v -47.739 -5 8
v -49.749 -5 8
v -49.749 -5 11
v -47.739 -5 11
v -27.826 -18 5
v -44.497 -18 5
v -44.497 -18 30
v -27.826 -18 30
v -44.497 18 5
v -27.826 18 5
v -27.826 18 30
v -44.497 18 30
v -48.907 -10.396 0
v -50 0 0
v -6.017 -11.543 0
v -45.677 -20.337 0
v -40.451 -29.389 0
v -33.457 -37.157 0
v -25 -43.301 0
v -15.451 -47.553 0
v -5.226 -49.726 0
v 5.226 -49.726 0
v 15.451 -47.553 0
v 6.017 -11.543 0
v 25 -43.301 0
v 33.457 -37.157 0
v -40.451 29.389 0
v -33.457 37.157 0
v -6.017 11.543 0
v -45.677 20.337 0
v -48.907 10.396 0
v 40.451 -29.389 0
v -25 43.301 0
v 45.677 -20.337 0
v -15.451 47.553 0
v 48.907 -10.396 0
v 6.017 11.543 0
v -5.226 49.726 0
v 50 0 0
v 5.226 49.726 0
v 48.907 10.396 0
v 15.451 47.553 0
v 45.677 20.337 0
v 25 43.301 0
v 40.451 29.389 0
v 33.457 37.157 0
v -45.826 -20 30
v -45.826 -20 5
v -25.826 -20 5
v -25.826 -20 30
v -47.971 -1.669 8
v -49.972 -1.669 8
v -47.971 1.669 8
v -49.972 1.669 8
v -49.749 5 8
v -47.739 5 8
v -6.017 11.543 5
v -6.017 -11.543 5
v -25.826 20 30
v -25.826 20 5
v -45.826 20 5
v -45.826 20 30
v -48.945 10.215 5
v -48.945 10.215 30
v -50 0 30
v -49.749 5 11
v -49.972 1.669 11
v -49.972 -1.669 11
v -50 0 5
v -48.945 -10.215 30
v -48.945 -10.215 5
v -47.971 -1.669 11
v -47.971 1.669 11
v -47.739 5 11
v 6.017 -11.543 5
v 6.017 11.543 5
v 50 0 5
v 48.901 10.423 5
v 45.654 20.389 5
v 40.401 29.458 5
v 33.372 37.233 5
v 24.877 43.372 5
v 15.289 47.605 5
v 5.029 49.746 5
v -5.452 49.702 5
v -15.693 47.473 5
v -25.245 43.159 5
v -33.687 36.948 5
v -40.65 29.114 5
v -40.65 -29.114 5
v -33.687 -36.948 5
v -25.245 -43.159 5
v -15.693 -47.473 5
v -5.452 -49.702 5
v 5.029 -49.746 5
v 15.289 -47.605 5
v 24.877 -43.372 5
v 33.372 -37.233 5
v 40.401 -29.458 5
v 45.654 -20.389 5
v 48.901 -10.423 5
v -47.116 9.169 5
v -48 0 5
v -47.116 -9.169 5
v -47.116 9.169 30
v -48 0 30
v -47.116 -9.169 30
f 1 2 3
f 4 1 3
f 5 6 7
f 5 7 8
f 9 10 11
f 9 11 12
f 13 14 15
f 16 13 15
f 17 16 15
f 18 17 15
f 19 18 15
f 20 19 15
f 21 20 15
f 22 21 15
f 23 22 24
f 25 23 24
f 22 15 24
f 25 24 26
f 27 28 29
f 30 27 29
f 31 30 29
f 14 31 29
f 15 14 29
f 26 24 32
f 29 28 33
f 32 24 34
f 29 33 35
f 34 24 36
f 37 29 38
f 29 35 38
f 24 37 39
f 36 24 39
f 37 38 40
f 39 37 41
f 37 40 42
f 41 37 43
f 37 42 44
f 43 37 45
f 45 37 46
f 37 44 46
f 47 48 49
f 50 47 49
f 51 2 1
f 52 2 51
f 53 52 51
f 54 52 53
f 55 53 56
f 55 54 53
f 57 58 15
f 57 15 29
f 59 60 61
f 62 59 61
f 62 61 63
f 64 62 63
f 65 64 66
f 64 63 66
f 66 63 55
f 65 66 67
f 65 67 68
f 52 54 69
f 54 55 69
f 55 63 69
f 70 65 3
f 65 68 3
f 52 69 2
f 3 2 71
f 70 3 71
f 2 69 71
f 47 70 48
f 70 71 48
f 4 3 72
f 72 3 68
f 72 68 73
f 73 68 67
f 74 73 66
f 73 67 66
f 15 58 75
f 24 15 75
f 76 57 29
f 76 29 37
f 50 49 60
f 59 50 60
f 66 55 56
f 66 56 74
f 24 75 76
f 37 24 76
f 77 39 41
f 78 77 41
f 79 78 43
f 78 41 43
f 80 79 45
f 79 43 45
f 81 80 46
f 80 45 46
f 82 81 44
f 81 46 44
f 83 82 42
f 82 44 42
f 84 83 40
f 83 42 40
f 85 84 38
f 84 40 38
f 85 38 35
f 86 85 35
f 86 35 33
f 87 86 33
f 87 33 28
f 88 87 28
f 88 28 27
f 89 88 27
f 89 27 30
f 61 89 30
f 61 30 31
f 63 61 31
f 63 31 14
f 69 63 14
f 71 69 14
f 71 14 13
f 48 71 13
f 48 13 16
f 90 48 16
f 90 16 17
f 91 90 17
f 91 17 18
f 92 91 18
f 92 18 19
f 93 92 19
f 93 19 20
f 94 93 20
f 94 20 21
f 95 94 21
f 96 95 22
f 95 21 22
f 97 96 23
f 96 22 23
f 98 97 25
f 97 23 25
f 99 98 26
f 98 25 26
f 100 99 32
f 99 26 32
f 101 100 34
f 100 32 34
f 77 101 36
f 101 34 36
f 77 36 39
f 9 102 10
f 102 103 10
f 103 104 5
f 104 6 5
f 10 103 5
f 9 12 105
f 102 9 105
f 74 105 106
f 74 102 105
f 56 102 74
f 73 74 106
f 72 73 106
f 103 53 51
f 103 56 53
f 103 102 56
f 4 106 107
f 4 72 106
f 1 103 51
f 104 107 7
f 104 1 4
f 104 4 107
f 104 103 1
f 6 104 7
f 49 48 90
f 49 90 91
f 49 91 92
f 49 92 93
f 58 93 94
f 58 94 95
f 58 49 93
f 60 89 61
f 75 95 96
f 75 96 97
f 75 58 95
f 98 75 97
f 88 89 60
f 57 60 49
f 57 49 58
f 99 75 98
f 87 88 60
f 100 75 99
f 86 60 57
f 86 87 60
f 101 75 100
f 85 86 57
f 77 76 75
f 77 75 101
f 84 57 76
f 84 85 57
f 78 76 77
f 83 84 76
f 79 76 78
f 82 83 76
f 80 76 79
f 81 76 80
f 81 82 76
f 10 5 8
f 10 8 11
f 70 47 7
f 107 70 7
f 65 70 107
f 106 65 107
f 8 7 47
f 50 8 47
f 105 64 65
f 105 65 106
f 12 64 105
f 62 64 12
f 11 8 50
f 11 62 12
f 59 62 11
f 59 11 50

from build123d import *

# Parameters (mm, degrees)
F0_R      = 50
F1_DEPTH  = 5
F3_DEPTH  = 25
F4_T      = -2
F6_W      = 10
F6_H      = 3
F7_DEPTH  = 3
F8_W      = 12.0332203805
F8_H      = 23.0855867267
F9_DEPTH  = 25
F10_R     = 50
F10_W     = 12.0332203805
F10_H     = 23.0855867267
F11_DEPTH = 5


with BuildPart() as f1:
    # F0 (on Top) → F1 (new body)
    with BuildSketch(Plane.XY):
        Circle(F0_R)
    extrude(amount=F1_DEPTH)

    # F2 (on face) → F3 (join)
    with BuildSketch(Plane.XY.offset(5)):
        with BuildLine():
            Line((-25.8257569496, 20), (-45.8257569496, 20))
            ThreePointArc((-45.8257569496, 20), (-50, 0), (-45.8257569496, -20))
            Line((-45.8257569496, -20), (-25.8257569496, -20))
            Line((-25.8257569496, -20), (-25.8257569496, 20))
        make_face()
    extrude(amount=F3_DEPTH)

    # F4
    f4_openings = [f1.faces().sort_by_distance(p)[0] for p in [
        (-37.262739, 0, 30),
    ]]
    offset(amount=F4_T, openings=f4_openings)

    # F6 (on offset) → F7 (cut)
    with BuildSketch(Plane.YZ.offset(-50)):
        with Locations((0, 9.5)):
            Rectangle(F6_W, F6_H)
    extrude(amount=F7_DEPTH, mode=Mode.SUBTRACT)

    # F8 (on face) → F9 (cut)
    with BuildSketch(Plane.XY.offset(5)):
        Rectangle(F8_W, F8_H)
    extrude(amount=-F9_DEPTH, mode=Mode.SUBTRACT)

    # F10 (on face) → F11 (join)
    with BuildSketch(Plane(origin=(0, 0, 0), x_dir=(1, 0, 0), z_dir=(0, 0, -1))):
        Circle(F10_R)
        Rectangle(F10_W, F10_H, mode=Mode.SUBTRACT)
    extrude(amount=-F11_DEPTH)


solid = f1.part
